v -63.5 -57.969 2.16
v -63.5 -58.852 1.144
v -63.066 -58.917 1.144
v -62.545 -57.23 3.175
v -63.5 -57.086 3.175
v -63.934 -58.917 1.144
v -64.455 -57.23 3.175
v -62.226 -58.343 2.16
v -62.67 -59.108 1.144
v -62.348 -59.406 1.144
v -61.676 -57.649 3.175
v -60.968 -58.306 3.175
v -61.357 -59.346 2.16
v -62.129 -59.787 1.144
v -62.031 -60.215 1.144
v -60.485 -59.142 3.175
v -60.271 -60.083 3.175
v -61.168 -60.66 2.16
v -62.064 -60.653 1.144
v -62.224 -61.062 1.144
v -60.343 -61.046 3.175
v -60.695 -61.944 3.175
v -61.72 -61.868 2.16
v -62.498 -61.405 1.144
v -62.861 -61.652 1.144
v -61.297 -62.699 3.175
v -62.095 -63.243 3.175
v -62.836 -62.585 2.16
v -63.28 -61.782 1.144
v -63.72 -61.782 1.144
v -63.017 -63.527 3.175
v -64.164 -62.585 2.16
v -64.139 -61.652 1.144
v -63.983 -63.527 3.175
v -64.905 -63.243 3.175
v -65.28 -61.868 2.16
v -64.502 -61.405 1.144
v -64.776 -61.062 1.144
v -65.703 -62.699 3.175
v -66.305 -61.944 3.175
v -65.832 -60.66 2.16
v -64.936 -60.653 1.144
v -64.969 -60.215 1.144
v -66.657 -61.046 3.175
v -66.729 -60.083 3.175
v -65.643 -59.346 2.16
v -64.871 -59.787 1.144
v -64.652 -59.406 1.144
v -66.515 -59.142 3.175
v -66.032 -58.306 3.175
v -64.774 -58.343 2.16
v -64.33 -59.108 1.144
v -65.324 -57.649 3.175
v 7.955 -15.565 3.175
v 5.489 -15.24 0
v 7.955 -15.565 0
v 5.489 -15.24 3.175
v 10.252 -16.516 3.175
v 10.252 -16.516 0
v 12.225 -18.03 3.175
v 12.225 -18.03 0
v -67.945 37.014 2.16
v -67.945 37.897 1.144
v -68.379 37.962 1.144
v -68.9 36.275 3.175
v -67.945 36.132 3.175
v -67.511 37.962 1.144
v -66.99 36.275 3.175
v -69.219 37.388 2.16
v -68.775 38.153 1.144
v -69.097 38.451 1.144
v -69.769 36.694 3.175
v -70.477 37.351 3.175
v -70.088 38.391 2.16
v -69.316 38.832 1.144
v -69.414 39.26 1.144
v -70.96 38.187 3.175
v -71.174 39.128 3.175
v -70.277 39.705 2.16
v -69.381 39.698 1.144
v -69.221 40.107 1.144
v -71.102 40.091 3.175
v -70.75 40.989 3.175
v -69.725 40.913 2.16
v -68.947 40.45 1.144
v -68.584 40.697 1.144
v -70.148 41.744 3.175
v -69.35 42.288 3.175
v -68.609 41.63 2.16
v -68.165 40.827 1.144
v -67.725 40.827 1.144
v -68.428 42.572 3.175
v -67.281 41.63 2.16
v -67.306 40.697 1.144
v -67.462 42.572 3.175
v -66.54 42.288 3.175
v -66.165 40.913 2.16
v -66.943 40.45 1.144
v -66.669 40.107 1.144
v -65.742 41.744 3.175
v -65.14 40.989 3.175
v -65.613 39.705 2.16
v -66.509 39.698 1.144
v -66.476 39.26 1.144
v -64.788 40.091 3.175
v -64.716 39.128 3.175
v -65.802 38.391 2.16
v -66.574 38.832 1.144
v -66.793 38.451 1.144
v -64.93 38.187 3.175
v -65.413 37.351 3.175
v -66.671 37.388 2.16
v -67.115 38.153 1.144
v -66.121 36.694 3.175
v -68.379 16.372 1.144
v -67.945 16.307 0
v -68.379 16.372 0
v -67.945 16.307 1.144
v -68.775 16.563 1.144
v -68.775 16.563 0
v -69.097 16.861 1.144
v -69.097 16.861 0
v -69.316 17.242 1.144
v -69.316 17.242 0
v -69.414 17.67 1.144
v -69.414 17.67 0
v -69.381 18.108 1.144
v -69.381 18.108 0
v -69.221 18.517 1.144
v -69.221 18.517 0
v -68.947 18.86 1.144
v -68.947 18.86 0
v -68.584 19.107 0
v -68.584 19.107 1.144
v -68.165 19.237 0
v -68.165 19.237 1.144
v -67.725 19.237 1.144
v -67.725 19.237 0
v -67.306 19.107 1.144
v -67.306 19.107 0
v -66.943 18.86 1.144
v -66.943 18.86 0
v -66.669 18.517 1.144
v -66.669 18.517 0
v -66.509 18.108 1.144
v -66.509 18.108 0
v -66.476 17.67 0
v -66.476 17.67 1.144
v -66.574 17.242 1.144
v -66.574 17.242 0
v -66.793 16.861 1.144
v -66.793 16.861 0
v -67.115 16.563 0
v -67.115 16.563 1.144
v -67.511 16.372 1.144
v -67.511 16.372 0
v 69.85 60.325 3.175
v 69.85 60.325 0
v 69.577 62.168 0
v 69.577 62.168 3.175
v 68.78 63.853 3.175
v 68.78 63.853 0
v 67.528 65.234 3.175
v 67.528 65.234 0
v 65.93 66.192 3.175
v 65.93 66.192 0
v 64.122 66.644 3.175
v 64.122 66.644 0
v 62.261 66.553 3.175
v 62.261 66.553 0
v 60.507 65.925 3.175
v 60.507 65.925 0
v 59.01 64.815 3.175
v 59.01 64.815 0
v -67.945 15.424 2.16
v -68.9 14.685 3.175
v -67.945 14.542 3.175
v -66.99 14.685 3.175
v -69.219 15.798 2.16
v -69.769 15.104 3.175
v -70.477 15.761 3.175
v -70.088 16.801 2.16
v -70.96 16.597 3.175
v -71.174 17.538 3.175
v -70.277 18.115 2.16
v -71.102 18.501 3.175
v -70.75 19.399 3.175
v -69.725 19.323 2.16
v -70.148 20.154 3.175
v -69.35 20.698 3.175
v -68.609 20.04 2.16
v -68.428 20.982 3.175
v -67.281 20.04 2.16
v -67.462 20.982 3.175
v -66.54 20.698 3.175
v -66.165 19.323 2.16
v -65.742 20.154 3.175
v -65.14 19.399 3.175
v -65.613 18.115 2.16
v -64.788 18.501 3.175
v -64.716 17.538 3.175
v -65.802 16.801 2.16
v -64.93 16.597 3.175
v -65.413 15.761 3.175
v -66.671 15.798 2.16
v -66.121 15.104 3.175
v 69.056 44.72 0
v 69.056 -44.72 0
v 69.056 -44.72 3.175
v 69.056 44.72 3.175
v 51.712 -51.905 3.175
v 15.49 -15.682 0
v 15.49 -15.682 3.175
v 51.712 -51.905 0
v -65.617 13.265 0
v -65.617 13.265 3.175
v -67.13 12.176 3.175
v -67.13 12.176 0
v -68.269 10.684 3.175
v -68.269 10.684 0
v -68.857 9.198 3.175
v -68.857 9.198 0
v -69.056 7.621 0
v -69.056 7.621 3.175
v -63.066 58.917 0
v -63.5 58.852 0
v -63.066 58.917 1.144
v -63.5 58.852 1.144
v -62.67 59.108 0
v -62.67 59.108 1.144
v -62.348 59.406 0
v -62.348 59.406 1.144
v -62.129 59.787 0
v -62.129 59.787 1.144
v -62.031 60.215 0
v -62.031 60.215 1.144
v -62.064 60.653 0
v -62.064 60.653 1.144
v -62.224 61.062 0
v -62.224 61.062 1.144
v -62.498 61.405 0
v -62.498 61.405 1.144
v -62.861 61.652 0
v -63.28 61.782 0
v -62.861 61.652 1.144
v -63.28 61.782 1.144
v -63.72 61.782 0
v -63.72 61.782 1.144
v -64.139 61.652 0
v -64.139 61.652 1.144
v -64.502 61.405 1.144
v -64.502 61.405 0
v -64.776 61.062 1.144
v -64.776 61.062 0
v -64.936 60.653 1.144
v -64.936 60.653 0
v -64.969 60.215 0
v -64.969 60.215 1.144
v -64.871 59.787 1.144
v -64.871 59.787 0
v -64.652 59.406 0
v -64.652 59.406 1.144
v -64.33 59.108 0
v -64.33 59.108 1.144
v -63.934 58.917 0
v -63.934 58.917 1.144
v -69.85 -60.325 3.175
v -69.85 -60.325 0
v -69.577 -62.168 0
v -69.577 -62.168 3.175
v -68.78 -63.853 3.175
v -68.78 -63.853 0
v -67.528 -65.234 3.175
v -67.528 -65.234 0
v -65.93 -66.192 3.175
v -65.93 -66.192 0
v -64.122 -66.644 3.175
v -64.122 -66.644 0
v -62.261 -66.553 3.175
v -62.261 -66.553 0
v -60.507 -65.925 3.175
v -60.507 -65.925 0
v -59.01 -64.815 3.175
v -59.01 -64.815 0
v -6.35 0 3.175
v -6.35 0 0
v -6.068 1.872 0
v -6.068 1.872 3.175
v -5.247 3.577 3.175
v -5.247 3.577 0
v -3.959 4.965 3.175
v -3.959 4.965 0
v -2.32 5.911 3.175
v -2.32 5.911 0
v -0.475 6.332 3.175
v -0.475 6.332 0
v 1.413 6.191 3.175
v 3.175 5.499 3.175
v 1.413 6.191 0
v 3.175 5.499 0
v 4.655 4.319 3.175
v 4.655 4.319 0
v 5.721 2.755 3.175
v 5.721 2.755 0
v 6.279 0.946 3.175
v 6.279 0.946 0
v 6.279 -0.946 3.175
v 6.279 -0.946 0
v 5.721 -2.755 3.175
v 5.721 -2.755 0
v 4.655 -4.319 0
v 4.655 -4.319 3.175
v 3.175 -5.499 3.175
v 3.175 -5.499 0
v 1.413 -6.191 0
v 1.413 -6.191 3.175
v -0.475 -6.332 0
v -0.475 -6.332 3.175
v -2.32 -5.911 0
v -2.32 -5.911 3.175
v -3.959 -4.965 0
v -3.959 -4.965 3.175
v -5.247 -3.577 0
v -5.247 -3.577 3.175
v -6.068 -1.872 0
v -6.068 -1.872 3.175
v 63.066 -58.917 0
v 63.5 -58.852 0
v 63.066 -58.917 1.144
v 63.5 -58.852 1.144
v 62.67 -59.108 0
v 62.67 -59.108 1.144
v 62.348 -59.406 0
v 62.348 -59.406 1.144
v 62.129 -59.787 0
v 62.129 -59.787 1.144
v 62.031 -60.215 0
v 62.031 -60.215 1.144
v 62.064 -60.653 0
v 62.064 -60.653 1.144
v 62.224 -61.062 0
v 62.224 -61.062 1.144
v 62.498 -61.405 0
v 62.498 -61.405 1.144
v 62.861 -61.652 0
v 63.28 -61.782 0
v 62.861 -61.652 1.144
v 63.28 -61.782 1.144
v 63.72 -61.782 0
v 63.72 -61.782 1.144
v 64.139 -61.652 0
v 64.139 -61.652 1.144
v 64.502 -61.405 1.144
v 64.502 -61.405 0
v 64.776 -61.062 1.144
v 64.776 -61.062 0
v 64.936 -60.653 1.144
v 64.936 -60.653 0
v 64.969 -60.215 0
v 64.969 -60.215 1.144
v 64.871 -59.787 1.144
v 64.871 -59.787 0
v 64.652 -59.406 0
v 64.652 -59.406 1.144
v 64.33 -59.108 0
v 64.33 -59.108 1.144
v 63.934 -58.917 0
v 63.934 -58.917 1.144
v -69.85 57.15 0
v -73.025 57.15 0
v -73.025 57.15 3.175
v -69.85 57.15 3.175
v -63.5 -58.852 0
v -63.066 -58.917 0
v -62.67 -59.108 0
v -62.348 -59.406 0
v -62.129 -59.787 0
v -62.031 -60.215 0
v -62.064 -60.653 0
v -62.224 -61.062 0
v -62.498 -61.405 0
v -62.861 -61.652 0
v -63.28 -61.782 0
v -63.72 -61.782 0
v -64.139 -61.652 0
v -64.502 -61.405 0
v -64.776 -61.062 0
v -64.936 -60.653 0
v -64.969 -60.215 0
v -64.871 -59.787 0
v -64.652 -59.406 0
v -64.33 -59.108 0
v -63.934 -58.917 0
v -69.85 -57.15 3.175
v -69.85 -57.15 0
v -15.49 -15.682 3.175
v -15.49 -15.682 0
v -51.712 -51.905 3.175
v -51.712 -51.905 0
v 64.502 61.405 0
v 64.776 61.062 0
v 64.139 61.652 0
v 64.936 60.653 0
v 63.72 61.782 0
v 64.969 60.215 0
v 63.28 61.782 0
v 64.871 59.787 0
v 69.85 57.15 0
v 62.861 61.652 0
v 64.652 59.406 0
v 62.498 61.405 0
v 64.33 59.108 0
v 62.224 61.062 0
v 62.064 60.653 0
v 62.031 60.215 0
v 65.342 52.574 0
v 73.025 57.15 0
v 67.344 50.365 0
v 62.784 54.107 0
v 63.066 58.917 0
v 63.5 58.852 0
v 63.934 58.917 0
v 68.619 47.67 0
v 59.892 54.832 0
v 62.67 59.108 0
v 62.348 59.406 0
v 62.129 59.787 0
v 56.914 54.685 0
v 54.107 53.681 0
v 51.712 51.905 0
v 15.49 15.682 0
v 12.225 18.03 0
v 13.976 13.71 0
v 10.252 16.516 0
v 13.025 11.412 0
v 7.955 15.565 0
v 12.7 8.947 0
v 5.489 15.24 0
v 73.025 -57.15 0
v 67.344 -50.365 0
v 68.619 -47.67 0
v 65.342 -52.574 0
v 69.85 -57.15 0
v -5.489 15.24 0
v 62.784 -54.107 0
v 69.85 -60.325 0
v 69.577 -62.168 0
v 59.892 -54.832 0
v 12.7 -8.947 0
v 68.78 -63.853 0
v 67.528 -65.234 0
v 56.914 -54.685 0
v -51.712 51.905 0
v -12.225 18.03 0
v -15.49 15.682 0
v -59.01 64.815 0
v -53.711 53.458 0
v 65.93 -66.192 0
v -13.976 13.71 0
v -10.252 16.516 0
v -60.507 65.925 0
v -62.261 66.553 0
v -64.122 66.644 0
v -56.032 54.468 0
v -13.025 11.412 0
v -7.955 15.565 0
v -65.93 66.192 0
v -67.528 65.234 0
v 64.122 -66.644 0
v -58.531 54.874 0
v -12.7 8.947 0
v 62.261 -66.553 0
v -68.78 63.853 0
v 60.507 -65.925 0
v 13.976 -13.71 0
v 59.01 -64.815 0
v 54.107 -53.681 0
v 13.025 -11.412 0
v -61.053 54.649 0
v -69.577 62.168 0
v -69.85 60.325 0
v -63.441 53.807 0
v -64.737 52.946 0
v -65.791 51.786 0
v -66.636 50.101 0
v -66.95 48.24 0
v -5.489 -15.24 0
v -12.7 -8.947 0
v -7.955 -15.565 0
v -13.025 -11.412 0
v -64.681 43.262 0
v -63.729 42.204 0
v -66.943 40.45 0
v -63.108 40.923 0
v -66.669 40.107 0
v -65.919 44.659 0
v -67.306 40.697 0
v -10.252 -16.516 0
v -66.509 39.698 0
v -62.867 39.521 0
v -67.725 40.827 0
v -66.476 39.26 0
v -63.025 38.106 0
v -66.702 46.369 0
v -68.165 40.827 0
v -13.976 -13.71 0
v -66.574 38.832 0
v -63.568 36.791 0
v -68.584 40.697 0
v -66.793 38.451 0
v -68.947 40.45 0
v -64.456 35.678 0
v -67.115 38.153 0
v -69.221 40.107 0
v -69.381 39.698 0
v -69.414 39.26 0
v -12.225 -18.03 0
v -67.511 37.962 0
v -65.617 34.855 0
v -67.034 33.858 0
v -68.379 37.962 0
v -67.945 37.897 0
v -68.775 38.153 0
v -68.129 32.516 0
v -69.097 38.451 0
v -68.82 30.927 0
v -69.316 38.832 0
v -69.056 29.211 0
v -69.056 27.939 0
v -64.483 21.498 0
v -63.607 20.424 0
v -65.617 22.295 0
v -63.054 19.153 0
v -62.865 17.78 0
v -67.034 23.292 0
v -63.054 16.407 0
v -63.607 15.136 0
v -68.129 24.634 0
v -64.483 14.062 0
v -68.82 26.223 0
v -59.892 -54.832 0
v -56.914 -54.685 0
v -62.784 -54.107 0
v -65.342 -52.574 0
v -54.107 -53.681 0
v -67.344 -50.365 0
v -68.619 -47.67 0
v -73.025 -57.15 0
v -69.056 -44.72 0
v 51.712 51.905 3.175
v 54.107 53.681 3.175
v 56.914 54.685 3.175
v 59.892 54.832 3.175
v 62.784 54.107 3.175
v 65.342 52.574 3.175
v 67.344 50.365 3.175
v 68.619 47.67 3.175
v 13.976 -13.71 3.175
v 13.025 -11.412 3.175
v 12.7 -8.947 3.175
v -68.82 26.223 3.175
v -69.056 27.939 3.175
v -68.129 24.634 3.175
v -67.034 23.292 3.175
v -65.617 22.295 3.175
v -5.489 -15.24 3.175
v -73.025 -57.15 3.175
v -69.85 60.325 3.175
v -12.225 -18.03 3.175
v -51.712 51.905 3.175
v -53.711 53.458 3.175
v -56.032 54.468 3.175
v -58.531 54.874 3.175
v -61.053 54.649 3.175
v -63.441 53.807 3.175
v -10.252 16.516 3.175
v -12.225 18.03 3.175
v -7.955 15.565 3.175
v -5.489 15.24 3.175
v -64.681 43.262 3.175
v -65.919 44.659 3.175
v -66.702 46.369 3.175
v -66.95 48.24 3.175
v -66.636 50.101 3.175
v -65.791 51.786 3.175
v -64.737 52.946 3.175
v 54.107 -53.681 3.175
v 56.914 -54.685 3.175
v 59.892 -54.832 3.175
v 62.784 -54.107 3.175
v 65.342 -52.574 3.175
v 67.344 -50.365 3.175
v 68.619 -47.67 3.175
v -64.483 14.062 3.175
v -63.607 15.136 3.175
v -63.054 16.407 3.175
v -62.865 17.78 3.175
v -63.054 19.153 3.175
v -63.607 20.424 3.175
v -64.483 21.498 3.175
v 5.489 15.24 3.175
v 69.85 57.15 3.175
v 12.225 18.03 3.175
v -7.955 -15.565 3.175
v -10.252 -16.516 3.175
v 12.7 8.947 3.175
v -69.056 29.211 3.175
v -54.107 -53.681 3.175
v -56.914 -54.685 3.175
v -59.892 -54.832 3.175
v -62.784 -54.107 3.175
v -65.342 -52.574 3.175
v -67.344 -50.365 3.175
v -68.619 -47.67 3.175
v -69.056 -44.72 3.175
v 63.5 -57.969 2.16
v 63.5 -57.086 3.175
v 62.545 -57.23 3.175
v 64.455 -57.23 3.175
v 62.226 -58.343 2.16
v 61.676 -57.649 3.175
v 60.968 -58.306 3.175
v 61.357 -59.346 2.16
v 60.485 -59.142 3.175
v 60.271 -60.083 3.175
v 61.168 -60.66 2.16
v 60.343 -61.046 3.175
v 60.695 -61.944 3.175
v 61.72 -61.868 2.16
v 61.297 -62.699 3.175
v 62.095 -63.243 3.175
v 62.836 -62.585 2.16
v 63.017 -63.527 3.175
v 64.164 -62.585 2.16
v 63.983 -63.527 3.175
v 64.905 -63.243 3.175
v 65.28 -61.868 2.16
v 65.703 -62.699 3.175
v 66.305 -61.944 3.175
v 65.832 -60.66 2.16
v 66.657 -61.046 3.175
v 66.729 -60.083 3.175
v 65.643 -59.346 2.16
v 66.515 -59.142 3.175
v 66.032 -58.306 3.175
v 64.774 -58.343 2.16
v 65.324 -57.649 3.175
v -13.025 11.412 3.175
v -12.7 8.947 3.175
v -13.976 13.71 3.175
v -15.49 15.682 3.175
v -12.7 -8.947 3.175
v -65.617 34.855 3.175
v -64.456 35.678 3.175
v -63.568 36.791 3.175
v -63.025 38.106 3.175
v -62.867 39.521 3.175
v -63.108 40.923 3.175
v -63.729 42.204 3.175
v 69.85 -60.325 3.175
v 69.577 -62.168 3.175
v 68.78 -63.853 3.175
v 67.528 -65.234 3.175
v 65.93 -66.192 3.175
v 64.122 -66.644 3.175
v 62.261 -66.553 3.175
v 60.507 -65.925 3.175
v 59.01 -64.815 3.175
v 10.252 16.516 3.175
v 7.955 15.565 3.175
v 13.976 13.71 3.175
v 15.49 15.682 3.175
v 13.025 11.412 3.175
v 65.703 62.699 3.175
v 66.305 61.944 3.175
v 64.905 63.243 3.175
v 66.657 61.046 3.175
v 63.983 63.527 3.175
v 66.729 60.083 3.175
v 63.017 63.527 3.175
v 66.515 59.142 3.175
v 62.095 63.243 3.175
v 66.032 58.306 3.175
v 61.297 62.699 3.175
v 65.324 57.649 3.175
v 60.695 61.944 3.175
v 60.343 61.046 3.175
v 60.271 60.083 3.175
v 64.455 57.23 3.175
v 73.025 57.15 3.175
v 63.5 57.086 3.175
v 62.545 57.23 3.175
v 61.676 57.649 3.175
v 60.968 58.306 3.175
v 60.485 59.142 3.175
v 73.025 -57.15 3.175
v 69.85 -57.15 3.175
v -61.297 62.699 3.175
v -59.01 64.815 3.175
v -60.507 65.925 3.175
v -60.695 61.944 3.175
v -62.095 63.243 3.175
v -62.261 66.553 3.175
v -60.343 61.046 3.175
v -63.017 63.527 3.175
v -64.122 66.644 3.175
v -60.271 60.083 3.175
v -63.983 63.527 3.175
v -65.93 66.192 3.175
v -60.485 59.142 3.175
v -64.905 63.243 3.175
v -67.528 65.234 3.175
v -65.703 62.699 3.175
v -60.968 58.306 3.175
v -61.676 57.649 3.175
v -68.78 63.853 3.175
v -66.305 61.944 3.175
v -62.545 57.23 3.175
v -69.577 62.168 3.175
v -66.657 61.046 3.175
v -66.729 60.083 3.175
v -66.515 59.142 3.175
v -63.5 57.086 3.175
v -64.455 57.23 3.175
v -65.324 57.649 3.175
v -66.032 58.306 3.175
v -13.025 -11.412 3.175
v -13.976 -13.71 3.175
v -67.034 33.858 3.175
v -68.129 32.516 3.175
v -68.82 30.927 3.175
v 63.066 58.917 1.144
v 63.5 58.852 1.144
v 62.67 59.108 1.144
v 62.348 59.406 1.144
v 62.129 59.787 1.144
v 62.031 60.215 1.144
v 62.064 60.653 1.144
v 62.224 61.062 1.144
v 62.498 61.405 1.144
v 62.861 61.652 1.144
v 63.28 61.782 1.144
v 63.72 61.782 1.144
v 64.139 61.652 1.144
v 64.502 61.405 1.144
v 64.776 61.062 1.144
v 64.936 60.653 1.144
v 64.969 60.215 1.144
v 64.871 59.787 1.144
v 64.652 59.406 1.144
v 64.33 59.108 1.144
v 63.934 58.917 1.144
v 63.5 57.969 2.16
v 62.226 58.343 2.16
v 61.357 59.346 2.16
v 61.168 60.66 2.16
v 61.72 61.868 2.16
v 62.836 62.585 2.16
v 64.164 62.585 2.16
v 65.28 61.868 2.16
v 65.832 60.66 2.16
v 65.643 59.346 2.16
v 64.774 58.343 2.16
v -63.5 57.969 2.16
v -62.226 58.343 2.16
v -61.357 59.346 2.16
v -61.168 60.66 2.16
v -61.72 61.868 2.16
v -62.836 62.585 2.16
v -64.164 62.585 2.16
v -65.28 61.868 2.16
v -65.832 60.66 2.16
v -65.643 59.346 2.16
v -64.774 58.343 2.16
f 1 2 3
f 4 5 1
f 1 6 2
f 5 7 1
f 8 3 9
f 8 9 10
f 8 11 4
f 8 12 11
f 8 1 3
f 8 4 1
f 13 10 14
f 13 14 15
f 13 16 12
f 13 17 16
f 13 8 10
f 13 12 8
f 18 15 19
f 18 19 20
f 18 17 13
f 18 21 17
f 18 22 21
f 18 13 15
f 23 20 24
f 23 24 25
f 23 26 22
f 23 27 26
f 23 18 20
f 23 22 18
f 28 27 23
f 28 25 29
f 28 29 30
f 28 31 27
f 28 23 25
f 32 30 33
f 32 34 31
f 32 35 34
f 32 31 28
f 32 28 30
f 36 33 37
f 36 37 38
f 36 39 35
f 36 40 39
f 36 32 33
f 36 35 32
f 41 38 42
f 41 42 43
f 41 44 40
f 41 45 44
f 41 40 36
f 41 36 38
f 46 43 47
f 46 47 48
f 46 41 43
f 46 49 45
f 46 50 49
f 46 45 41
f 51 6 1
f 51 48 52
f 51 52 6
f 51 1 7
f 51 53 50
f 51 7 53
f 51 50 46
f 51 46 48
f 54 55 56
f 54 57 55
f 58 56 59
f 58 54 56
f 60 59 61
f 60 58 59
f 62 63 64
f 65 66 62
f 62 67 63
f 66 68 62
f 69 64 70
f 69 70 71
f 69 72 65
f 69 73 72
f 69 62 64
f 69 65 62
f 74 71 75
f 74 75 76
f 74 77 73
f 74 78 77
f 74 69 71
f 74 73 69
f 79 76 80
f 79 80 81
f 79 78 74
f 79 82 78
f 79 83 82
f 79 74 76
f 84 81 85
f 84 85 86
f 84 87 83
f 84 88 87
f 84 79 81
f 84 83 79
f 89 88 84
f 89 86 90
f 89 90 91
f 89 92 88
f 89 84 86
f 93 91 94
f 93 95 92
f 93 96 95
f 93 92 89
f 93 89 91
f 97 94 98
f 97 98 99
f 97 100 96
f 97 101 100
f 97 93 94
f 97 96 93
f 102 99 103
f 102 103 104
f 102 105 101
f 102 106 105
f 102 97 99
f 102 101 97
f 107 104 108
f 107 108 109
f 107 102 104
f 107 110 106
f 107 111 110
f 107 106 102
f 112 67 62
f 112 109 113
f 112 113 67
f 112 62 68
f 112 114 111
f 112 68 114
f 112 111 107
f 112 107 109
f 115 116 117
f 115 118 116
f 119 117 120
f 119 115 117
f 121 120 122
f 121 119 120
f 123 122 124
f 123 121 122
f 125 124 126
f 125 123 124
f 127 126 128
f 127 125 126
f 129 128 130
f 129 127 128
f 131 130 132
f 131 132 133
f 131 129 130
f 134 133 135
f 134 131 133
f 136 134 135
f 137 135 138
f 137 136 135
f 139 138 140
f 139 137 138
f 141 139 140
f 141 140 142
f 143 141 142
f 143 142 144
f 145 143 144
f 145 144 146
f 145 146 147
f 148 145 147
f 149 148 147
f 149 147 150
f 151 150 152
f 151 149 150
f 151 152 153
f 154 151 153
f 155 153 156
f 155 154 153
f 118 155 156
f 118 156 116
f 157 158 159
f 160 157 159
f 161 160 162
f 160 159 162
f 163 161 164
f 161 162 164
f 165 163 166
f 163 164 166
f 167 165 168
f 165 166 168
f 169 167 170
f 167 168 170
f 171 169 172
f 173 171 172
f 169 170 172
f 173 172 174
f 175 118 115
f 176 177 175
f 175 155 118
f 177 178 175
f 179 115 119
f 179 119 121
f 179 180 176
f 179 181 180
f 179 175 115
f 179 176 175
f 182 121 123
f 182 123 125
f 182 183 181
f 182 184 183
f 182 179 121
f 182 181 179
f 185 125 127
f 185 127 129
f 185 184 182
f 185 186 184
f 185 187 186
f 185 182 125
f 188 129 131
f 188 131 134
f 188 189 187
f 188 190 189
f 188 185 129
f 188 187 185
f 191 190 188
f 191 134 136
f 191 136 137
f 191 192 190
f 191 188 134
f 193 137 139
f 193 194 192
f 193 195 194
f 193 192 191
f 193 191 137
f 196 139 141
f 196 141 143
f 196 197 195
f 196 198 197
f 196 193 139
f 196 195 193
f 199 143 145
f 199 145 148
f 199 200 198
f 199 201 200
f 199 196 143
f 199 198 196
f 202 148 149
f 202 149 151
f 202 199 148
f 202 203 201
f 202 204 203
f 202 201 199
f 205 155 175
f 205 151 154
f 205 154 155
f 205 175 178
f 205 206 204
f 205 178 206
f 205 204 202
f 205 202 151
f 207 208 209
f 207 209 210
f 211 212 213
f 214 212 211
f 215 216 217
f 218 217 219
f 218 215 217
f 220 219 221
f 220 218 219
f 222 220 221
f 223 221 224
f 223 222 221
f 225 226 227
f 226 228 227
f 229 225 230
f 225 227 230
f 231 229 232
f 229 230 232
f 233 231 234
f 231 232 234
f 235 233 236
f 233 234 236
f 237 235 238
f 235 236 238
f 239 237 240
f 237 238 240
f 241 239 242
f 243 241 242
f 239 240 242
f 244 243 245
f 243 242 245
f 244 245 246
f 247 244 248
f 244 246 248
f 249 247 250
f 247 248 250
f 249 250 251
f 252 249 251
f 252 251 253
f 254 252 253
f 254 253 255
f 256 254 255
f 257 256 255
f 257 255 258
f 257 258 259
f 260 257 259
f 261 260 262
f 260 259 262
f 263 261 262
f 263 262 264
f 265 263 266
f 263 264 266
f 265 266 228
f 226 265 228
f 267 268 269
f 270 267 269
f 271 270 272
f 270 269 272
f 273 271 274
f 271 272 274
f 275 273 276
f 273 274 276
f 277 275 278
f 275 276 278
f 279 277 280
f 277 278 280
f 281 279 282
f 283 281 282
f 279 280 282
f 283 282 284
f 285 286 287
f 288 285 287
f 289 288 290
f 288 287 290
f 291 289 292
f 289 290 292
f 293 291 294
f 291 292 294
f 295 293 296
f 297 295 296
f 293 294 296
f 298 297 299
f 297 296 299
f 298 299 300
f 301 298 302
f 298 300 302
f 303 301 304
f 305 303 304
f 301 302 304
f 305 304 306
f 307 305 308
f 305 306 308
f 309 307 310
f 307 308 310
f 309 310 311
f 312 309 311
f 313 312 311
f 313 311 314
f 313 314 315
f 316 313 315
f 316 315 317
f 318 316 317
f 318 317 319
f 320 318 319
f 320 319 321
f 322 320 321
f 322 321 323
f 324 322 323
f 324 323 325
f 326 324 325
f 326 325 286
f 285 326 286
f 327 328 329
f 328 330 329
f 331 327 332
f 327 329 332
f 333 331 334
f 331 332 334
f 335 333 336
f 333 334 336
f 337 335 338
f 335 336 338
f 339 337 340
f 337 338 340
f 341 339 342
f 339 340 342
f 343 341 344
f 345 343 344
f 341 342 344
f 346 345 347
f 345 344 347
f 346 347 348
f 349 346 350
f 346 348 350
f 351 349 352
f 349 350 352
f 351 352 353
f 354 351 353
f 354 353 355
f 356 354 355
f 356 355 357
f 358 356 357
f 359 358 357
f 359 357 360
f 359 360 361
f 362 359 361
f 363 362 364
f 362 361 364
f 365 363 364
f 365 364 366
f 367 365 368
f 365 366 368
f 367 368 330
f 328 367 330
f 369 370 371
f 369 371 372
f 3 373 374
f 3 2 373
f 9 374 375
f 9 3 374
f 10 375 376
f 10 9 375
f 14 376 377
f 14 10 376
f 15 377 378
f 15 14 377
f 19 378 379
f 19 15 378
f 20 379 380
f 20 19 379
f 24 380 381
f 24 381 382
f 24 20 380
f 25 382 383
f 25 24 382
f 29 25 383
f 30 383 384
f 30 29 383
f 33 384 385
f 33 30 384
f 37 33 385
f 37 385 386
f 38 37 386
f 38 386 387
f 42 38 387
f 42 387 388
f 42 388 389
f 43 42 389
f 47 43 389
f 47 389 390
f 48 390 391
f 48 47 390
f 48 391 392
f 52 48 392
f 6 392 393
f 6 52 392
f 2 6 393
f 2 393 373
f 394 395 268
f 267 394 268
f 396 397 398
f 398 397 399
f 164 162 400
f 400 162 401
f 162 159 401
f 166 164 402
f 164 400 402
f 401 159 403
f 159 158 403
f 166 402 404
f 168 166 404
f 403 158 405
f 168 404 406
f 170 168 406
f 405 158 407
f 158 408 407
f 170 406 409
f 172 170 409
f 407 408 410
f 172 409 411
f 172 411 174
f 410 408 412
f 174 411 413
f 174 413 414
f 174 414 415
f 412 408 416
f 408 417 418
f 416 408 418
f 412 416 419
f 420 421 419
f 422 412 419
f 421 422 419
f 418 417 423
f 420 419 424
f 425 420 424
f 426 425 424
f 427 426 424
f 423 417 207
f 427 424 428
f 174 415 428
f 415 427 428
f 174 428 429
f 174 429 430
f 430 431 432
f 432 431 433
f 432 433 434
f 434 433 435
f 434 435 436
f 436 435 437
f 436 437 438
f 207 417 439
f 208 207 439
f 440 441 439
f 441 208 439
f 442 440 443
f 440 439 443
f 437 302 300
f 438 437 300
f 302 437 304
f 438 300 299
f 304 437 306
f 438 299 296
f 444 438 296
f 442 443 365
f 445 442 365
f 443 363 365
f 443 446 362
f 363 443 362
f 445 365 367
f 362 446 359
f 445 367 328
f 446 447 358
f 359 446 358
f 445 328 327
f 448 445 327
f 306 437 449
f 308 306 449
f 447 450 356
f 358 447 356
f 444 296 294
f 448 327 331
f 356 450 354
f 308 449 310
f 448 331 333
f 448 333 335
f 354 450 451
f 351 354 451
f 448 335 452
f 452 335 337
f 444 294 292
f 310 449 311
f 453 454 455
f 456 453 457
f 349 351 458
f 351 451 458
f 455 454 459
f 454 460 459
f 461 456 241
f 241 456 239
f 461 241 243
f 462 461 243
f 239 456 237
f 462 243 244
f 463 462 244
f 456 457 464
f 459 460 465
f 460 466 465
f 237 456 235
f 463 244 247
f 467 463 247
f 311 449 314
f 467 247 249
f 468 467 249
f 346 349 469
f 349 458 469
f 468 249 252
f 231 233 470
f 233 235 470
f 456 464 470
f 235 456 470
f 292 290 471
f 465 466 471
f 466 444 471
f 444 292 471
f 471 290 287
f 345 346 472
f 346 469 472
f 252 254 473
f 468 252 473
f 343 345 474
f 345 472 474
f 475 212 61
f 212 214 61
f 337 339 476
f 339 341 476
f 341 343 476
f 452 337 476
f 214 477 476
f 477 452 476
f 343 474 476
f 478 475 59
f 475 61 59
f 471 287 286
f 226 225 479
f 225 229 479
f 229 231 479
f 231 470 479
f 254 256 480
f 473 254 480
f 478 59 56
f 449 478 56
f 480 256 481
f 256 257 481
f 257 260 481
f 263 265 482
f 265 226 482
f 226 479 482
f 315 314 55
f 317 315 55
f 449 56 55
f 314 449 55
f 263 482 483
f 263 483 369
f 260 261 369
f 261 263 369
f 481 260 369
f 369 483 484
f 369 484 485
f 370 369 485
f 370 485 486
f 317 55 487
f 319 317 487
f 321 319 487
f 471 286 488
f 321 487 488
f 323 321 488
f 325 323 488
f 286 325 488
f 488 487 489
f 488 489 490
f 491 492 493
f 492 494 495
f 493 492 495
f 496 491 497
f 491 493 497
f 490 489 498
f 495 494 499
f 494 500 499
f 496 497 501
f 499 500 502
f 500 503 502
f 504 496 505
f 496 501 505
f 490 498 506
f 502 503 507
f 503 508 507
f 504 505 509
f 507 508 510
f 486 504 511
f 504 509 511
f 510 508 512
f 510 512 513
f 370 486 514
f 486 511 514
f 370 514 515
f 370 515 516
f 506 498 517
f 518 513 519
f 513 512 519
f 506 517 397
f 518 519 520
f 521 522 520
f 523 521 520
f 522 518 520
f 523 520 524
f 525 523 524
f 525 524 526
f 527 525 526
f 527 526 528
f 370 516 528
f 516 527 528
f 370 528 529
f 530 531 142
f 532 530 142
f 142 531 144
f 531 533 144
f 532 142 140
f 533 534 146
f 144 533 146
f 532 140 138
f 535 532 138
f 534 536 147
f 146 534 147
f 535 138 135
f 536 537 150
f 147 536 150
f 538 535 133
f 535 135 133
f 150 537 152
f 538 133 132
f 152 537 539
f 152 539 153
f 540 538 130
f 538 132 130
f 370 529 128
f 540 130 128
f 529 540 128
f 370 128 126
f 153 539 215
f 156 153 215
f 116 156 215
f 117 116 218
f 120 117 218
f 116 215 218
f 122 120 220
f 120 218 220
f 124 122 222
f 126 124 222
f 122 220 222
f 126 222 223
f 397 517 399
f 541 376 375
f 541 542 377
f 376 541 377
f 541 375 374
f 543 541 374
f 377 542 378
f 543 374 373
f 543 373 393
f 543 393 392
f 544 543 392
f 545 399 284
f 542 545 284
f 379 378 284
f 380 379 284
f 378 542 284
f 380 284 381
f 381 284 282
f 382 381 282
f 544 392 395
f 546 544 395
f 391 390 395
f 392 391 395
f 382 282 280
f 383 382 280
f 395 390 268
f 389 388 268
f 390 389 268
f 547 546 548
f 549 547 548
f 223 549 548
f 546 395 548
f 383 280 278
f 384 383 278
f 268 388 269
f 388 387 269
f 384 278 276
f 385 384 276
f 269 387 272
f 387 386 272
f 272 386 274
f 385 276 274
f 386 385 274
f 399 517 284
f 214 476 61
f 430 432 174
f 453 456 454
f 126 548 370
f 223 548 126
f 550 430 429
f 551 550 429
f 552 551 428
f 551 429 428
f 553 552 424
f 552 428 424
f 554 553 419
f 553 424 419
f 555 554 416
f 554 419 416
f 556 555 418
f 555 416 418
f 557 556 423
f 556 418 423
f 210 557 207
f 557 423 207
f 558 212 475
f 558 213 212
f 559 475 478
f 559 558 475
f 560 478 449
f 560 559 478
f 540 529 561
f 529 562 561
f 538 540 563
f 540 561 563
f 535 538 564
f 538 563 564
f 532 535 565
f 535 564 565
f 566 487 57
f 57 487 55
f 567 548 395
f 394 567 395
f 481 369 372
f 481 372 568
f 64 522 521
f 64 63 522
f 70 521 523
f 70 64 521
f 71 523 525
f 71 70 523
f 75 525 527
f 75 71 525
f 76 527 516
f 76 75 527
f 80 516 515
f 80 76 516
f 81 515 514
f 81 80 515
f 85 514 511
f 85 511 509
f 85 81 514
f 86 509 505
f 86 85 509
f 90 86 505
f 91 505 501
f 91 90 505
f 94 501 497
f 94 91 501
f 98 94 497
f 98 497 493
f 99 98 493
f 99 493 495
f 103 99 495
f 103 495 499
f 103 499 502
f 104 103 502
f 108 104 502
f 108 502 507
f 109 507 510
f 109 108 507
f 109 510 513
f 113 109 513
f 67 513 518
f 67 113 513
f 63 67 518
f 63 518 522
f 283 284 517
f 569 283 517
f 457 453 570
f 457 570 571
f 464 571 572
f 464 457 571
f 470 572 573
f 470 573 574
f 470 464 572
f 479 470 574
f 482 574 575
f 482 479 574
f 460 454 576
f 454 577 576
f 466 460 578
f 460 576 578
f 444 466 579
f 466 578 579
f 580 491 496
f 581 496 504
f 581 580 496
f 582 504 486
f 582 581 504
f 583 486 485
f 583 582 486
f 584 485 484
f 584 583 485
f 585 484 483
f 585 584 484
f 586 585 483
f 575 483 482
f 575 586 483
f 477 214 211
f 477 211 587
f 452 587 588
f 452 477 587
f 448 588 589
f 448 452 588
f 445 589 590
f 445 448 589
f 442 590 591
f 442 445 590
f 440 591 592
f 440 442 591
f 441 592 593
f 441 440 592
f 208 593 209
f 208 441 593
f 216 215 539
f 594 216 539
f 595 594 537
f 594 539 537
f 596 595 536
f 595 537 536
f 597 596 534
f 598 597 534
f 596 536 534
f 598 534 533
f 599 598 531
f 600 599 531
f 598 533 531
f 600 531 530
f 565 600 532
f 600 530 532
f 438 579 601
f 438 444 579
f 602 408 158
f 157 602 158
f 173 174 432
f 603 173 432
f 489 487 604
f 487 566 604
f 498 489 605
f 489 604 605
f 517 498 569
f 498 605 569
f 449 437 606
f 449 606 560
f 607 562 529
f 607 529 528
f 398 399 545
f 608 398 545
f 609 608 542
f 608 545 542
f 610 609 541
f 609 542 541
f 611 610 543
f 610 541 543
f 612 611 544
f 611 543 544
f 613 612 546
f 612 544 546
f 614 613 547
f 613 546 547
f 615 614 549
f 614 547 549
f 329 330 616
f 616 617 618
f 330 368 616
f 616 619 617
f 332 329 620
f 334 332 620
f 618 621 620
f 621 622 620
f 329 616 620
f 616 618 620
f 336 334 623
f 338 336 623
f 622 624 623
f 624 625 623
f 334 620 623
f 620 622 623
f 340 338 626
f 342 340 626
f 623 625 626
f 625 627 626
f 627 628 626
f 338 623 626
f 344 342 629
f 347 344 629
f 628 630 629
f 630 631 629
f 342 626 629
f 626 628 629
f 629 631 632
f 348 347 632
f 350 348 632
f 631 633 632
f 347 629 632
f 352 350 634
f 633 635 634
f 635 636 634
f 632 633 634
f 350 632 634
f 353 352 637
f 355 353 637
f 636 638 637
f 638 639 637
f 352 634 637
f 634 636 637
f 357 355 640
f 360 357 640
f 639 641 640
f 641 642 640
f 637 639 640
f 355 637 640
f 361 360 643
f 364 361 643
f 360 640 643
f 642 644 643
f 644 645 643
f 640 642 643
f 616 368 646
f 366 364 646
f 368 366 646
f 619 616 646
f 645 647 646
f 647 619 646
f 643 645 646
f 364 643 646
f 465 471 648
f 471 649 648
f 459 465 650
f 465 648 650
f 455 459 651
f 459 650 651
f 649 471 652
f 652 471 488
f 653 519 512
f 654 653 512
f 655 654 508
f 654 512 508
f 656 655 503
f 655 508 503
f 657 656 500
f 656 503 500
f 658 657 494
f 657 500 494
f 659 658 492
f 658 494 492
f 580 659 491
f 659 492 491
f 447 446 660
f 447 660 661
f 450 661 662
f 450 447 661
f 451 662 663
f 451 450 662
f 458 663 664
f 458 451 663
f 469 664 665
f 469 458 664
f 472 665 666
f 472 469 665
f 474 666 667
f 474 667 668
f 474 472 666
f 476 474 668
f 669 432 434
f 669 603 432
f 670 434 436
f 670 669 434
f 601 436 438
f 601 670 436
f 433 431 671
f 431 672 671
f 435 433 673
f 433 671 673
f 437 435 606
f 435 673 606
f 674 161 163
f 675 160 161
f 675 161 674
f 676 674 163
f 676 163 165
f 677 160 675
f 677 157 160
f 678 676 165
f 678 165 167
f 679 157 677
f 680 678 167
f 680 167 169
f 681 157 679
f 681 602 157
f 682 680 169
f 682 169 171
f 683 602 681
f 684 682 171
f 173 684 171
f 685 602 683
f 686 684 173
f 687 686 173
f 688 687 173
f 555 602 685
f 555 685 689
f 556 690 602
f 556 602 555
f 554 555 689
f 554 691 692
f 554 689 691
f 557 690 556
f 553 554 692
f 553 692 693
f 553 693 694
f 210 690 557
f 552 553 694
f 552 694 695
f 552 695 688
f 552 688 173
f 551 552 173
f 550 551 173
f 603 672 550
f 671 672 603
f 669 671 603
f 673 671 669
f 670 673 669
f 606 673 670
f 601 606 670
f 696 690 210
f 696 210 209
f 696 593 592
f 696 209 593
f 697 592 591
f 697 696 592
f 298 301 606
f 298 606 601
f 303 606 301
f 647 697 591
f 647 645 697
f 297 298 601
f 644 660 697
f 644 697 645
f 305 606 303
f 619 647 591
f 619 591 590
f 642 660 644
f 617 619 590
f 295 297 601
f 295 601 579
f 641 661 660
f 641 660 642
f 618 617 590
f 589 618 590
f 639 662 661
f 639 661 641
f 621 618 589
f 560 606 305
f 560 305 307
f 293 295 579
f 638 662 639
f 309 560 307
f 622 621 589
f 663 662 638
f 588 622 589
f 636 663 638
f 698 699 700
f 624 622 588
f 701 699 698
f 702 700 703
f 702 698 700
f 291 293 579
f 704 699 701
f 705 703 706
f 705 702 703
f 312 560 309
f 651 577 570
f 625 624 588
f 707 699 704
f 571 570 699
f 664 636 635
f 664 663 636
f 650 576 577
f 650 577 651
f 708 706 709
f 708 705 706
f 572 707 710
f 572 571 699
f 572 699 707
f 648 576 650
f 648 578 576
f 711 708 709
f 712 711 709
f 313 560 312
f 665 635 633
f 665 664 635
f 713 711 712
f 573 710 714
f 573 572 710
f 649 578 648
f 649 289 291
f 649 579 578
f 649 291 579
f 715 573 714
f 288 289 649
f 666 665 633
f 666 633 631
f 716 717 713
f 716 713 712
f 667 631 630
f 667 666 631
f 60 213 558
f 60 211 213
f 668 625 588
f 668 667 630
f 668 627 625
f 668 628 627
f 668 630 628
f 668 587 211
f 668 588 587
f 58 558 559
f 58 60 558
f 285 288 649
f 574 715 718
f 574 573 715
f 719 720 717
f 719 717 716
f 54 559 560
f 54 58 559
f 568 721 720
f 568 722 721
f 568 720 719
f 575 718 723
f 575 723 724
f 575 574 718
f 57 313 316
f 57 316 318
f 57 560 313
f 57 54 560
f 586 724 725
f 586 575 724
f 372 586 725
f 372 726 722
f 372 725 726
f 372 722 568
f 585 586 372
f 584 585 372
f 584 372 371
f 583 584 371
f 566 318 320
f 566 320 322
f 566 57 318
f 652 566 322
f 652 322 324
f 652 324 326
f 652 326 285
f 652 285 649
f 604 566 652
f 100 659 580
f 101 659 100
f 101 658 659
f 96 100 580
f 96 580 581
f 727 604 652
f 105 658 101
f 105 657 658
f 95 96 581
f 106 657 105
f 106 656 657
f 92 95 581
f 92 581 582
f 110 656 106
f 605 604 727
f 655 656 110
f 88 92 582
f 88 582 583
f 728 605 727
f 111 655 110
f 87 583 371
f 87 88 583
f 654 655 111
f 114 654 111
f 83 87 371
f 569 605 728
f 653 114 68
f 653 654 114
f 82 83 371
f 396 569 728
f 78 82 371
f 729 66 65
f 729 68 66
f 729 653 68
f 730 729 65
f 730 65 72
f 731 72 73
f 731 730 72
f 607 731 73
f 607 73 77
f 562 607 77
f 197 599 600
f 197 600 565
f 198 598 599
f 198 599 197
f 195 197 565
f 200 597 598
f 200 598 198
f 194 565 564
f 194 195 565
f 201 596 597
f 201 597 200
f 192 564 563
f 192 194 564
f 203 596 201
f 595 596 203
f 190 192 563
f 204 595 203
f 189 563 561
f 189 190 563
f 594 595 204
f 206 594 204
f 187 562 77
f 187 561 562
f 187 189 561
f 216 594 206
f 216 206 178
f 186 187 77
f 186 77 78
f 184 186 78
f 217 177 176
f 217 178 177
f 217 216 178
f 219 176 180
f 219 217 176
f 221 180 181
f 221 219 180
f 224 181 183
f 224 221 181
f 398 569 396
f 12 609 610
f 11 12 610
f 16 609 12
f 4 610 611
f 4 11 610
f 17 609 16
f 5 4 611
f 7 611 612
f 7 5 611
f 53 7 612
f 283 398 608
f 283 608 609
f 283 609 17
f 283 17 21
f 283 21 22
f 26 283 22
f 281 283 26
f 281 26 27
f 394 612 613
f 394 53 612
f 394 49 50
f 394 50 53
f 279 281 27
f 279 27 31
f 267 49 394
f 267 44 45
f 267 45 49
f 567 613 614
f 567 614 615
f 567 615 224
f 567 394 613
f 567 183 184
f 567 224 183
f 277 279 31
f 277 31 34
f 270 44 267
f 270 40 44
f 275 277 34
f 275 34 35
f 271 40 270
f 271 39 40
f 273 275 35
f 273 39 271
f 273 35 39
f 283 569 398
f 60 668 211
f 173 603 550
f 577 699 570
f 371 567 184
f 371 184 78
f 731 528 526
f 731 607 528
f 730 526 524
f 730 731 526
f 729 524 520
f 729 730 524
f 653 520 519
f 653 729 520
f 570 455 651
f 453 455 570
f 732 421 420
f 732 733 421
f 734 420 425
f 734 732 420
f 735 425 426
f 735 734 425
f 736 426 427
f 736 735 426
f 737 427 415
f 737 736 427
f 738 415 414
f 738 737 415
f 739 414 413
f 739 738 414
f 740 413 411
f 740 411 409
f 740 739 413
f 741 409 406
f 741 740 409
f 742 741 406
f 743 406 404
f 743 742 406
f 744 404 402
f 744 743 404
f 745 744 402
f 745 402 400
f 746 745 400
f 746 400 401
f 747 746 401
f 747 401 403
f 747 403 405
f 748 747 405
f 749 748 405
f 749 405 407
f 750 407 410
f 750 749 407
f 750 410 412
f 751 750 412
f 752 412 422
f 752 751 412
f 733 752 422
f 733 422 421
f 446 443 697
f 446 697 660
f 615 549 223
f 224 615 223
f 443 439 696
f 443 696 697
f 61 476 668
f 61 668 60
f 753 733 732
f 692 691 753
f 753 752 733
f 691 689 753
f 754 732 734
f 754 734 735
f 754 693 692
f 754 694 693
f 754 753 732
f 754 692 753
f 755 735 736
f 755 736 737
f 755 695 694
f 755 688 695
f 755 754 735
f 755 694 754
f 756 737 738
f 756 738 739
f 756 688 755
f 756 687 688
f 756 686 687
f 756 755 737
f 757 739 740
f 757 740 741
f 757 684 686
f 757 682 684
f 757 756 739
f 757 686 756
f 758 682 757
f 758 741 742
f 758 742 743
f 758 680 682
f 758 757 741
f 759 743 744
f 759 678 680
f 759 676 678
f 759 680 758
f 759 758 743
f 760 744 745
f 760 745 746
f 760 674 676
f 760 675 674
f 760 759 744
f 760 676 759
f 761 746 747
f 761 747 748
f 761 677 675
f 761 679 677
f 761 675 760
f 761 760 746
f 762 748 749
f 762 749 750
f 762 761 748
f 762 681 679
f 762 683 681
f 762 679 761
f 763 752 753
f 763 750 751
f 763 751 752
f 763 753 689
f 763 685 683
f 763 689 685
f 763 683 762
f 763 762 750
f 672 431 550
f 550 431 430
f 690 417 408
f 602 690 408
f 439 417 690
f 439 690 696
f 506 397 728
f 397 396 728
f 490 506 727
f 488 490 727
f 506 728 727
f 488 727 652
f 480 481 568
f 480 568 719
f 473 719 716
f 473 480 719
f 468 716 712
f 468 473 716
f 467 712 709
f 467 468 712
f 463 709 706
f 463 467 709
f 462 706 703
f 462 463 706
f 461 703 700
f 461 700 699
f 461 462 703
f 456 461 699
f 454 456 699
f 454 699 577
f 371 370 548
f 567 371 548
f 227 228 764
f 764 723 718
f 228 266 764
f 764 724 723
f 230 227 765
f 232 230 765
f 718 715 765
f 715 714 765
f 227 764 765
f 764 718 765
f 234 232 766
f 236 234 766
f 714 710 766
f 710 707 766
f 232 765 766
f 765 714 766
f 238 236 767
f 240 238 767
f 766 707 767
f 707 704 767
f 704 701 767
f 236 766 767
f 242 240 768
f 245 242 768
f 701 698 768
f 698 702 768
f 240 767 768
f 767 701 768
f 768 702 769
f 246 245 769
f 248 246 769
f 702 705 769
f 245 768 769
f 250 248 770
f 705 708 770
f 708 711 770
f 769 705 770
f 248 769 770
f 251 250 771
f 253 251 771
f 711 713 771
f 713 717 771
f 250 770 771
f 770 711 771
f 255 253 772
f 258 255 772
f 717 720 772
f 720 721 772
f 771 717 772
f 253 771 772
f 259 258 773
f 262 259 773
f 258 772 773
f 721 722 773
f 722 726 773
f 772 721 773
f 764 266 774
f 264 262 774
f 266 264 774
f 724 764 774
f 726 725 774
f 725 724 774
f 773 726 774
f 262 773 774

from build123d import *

# Parameters (mm, degrees)
BOSS_EXTRUDE1_DEPTH           = 3.175
MIRROR2_COPY_1_DEPTH          = 3.175
INTERNAL_SHARPS_R             = 9.525
IMU_MOUNTING_DEPTH            = 3.175
IMU_MOUNTING_HOLES_AT_2_COUNT = 2
IMU_MOUNTING_HOLES_AT_2_PITCH = 21.59
FILLET4_R                     = 6.35
SKETCH6_R                     = 6.35
MATERIAL_REMOVAL_DEPTH        = 99.935771608


with BuildPart() as part:
    # Sketch1 → Boss-Extrude1 (new body)
    with BuildSketch(Plane.XY):
        with BuildLine():
            Line((9.434743879, 15.24), (0, 15.24))
            Line((0, 15.24), (0, 0))
            Line((0, 0), (12.7, 0))
            Line((12.7, 0), (12.7, 12.892596045))
            Line((12.7, 12.892596045), (51.712045103, 51.904641149))
            ThreePointArc((51.712045103, 51.904641149), (62.784313673, 54.107052302), (69.05625, 44.720436252))
            Line((69.05625, 44.720436252), (69.05625, 0))
            Line((69.05625, 0), (73.025, 0))
            Line((73.025, 0), (73.025, 57.15))
            Line((73.025, 57.15), (69.85, 57.15))
            Line((69.85, 57.15), (69.85, 60.325))
            ThreePointArc((69.85, 60.325), (65.930039796, 66.191635031), (59.009871939, 64.815128061))
            Line((59.009871939, 64.815128061), (9.434743879, 15.24))
        make_face()
    boss_extrude1 = extrude(amount=BOSS_EXTRUDE1_DEPTH)

    # Sketch11 → CSK for #4 Flat Head Machine Screw1 (revolve, cut)
    with BuildSketch(Plane(origin=(63.5, 60.325, 3.175), x_dir=(0, -1, 0), z_dir=(1, 0, 0))):
        Polygon((0, 0), (0, 3.175), (1.4732, 3.175), (1.4732, 2.030745349), (3.2385, 0), align=None)
    csk_for_4_flat_head_machine_screw1 = revolve(axis=Axis((63.5, 60.325, 9.525), (0, 0, -1)), mode=Mode.SUBTRACT)

    # Mirror1: Boss-Extrude1, CSK for #4 Flat Head Machine Screw1 across plane
    add(boss_extrude1.mirror(Plane.ZX))
    add(csk_for_4_flat_head_machine_screw1.mirror(Plane.ZX), mode=Mode.SUBTRACT)

    # Mirror2: Boss-Extrude1, CSK for #4 Flat Head Machine Screw1 across plane
    add(boss_extrude1.mirror(Plane(origin=(0, 0, 0), x_dir=(0, 0, 1), z_dir=(1, 0, 0))))
    add(csk_for_4_flat_head_machine_screw1.mirror(Plane(origin=(0, 0, 0), x_dir=(0, 0, 1), z_dir=(1, 0, 0))), mode=Mode.SUBTRACT)

    # Mirror2 copy 1 sketch → Mirror2 copy 1 (add)
    with BuildSketch(Plane(origin=(0, 0, 0), x_dir=(-1, 0, 0), z_dir=(0, 0, 1))):
        with BuildLine():
            Line((9.434743879, 15.24), (0, 15.24))
            Line((0, 15.24), (0, 0))
            Line((0, 0), (12.7, 0))
            Line((12.7, 0), (12.7, 12.892596045))
            Line((12.7, 12.892596045), (51.712045103, 51.904641149))
            ThreePointArc((51.712045103, 51.904641149), (62.784313673, 54.107052302), (69.05625, 44.720436252))
            Line((69.05625, 44.720436252), (69.05625, 0))
            Line((69.05625, 0), (73.025, 0))
            Line((73.025, 0), (73.025, 57.15))
            Line((73.025, 57.15), (69.85, 57.15))
            Line((69.85, 57.15), (69.85, 60.325))
            ThreePointArc((69.85, 60.325), (65.930039796, 66.191635031), (59.009871939, 64.815128061))
            Line((59.009871939, 64.815128061), (9.434743879, 15.24))
        make_face()
    extrude(amount=MIRROR2_COPY_1_DEPTH)

    # Mirror2 copy 2 sketch → Mirror2 copy 2 (revolve, cut)
    with BuildSketch(Plane(origin=(-63.5, -60.325, 3.175), x_dir=(0, 1, 0), z_dir=(-1, 0, 0))):
        Polygon((0, 0), (0, 3.175), (1.4732, 3.175), (1.4732, 2.030745349), (3.2385, 0), align=None)
    revolve(axis=Axis((-63.5, -60.325, 9.525), (0, 0, -1)), mode=Mode.SUBTRACT)

    # INTERNAL-SHARPS
    internal_sharps_edges = [part.edges().sort_by_distance(p)[0] for p in [
        (-9.434743879, 15.24, 1.5875),
        (-12.7, 12.892596045, 1.5875),
        (9.434743879, 15.24, 1.5875),
        (12.7, 12.892596045, 1.5875),
        (9.434743879, -15.24, 1.5875),
        (12.7, -12.892596045, 1.5875),
        (-12.7, -12.892596045, 1.5875),
        (-9.434743879, -15.24, 1.5875),
    ]]
    fillet(internal_sharps_edges, radius=INTERNAL_SHARPS_R)

    # Sketch13 → IMU-MOUNTING (add)
    with BuildSketch(Plane.XY):
        with BuildLine():
            Line((-73.025, 44.45), (-73.025, 12.7))
            Line((-73.025, 12.7), (-67.945, 12.7))
            ThreePointArc((-67.945, 12.7), (-62.895851895, 18.339020045), (-69.05625, 22.736967161))
            Line((-69.05625, 22.736967161), (-69.05625, 34.413032839))
            ThreePointArc((-69.05625, 34.413032839), (-62.895851895, 38.810979955), (-67.945, 44.45))
            Line((-67.945, 44.45), (-73.025, 44.45))
        make_face()
    extrude(amount=IMU_MOUNTING_DEPTH)

    # Sketch15 → IMU-MOUNTING-HOLES (revolve, cut)
    with BuildSketch(Plane(origin=(-67.945, 17.78, 3.175), x_dir=(0, -1, 0), z_dir=(1, 0, 0))):
        Polygon((0, 0), (0, 3.175), (1.4732, 3.175), (1.4732, 2.030745349), (3.2385, 0), align=None)
    imu_mounting_holes = revolve(axis=Axis((-67.945, 17.78, 9.525), (0, 0, -1)), mode=Mode.SUBTRACT)

    # IMU-MOUNTING-HOLES at 2: IMU-MOUNTING-HOLES ×2
    with Locations(*[(0, i * IMU_MOUNTING_HOLES_AT_2_PITCH, 0) for i in range(1, IMU_MOUNTING_HOLES_AT_2_COUNT)]):
        add(imu_mounting_holes, mode=Mode.SUBTRACT)

    # Fillet4
    fillet4_edges = [part.edges().sort_by_distance(p)[0] for p in [
        (-69.05625, 44.45, 1.5875),
        (-69.05625, 12.7, 1.5875),
        (-69.05625, 22.736967161, 1.5875),
        (-69.05625, 34.413032839, 1.5875),
    ]]
    fillet(fillet4_edges, radius=FILLET4_R)

    # Sketch6 → MATERIAL-REMOVAL (cut, through all)
    with BuildSketch(Plane(origin=(0, 0, 0), x_dir=(-1, 0, 0), z_dir=(0, 0, -1))):
        Circle(SKETCH6_R)
    extrude(amount=-MATERIAL_REMOVAL_DEPTH, mode=Mode.SUBTRACT)


solid = part.part
